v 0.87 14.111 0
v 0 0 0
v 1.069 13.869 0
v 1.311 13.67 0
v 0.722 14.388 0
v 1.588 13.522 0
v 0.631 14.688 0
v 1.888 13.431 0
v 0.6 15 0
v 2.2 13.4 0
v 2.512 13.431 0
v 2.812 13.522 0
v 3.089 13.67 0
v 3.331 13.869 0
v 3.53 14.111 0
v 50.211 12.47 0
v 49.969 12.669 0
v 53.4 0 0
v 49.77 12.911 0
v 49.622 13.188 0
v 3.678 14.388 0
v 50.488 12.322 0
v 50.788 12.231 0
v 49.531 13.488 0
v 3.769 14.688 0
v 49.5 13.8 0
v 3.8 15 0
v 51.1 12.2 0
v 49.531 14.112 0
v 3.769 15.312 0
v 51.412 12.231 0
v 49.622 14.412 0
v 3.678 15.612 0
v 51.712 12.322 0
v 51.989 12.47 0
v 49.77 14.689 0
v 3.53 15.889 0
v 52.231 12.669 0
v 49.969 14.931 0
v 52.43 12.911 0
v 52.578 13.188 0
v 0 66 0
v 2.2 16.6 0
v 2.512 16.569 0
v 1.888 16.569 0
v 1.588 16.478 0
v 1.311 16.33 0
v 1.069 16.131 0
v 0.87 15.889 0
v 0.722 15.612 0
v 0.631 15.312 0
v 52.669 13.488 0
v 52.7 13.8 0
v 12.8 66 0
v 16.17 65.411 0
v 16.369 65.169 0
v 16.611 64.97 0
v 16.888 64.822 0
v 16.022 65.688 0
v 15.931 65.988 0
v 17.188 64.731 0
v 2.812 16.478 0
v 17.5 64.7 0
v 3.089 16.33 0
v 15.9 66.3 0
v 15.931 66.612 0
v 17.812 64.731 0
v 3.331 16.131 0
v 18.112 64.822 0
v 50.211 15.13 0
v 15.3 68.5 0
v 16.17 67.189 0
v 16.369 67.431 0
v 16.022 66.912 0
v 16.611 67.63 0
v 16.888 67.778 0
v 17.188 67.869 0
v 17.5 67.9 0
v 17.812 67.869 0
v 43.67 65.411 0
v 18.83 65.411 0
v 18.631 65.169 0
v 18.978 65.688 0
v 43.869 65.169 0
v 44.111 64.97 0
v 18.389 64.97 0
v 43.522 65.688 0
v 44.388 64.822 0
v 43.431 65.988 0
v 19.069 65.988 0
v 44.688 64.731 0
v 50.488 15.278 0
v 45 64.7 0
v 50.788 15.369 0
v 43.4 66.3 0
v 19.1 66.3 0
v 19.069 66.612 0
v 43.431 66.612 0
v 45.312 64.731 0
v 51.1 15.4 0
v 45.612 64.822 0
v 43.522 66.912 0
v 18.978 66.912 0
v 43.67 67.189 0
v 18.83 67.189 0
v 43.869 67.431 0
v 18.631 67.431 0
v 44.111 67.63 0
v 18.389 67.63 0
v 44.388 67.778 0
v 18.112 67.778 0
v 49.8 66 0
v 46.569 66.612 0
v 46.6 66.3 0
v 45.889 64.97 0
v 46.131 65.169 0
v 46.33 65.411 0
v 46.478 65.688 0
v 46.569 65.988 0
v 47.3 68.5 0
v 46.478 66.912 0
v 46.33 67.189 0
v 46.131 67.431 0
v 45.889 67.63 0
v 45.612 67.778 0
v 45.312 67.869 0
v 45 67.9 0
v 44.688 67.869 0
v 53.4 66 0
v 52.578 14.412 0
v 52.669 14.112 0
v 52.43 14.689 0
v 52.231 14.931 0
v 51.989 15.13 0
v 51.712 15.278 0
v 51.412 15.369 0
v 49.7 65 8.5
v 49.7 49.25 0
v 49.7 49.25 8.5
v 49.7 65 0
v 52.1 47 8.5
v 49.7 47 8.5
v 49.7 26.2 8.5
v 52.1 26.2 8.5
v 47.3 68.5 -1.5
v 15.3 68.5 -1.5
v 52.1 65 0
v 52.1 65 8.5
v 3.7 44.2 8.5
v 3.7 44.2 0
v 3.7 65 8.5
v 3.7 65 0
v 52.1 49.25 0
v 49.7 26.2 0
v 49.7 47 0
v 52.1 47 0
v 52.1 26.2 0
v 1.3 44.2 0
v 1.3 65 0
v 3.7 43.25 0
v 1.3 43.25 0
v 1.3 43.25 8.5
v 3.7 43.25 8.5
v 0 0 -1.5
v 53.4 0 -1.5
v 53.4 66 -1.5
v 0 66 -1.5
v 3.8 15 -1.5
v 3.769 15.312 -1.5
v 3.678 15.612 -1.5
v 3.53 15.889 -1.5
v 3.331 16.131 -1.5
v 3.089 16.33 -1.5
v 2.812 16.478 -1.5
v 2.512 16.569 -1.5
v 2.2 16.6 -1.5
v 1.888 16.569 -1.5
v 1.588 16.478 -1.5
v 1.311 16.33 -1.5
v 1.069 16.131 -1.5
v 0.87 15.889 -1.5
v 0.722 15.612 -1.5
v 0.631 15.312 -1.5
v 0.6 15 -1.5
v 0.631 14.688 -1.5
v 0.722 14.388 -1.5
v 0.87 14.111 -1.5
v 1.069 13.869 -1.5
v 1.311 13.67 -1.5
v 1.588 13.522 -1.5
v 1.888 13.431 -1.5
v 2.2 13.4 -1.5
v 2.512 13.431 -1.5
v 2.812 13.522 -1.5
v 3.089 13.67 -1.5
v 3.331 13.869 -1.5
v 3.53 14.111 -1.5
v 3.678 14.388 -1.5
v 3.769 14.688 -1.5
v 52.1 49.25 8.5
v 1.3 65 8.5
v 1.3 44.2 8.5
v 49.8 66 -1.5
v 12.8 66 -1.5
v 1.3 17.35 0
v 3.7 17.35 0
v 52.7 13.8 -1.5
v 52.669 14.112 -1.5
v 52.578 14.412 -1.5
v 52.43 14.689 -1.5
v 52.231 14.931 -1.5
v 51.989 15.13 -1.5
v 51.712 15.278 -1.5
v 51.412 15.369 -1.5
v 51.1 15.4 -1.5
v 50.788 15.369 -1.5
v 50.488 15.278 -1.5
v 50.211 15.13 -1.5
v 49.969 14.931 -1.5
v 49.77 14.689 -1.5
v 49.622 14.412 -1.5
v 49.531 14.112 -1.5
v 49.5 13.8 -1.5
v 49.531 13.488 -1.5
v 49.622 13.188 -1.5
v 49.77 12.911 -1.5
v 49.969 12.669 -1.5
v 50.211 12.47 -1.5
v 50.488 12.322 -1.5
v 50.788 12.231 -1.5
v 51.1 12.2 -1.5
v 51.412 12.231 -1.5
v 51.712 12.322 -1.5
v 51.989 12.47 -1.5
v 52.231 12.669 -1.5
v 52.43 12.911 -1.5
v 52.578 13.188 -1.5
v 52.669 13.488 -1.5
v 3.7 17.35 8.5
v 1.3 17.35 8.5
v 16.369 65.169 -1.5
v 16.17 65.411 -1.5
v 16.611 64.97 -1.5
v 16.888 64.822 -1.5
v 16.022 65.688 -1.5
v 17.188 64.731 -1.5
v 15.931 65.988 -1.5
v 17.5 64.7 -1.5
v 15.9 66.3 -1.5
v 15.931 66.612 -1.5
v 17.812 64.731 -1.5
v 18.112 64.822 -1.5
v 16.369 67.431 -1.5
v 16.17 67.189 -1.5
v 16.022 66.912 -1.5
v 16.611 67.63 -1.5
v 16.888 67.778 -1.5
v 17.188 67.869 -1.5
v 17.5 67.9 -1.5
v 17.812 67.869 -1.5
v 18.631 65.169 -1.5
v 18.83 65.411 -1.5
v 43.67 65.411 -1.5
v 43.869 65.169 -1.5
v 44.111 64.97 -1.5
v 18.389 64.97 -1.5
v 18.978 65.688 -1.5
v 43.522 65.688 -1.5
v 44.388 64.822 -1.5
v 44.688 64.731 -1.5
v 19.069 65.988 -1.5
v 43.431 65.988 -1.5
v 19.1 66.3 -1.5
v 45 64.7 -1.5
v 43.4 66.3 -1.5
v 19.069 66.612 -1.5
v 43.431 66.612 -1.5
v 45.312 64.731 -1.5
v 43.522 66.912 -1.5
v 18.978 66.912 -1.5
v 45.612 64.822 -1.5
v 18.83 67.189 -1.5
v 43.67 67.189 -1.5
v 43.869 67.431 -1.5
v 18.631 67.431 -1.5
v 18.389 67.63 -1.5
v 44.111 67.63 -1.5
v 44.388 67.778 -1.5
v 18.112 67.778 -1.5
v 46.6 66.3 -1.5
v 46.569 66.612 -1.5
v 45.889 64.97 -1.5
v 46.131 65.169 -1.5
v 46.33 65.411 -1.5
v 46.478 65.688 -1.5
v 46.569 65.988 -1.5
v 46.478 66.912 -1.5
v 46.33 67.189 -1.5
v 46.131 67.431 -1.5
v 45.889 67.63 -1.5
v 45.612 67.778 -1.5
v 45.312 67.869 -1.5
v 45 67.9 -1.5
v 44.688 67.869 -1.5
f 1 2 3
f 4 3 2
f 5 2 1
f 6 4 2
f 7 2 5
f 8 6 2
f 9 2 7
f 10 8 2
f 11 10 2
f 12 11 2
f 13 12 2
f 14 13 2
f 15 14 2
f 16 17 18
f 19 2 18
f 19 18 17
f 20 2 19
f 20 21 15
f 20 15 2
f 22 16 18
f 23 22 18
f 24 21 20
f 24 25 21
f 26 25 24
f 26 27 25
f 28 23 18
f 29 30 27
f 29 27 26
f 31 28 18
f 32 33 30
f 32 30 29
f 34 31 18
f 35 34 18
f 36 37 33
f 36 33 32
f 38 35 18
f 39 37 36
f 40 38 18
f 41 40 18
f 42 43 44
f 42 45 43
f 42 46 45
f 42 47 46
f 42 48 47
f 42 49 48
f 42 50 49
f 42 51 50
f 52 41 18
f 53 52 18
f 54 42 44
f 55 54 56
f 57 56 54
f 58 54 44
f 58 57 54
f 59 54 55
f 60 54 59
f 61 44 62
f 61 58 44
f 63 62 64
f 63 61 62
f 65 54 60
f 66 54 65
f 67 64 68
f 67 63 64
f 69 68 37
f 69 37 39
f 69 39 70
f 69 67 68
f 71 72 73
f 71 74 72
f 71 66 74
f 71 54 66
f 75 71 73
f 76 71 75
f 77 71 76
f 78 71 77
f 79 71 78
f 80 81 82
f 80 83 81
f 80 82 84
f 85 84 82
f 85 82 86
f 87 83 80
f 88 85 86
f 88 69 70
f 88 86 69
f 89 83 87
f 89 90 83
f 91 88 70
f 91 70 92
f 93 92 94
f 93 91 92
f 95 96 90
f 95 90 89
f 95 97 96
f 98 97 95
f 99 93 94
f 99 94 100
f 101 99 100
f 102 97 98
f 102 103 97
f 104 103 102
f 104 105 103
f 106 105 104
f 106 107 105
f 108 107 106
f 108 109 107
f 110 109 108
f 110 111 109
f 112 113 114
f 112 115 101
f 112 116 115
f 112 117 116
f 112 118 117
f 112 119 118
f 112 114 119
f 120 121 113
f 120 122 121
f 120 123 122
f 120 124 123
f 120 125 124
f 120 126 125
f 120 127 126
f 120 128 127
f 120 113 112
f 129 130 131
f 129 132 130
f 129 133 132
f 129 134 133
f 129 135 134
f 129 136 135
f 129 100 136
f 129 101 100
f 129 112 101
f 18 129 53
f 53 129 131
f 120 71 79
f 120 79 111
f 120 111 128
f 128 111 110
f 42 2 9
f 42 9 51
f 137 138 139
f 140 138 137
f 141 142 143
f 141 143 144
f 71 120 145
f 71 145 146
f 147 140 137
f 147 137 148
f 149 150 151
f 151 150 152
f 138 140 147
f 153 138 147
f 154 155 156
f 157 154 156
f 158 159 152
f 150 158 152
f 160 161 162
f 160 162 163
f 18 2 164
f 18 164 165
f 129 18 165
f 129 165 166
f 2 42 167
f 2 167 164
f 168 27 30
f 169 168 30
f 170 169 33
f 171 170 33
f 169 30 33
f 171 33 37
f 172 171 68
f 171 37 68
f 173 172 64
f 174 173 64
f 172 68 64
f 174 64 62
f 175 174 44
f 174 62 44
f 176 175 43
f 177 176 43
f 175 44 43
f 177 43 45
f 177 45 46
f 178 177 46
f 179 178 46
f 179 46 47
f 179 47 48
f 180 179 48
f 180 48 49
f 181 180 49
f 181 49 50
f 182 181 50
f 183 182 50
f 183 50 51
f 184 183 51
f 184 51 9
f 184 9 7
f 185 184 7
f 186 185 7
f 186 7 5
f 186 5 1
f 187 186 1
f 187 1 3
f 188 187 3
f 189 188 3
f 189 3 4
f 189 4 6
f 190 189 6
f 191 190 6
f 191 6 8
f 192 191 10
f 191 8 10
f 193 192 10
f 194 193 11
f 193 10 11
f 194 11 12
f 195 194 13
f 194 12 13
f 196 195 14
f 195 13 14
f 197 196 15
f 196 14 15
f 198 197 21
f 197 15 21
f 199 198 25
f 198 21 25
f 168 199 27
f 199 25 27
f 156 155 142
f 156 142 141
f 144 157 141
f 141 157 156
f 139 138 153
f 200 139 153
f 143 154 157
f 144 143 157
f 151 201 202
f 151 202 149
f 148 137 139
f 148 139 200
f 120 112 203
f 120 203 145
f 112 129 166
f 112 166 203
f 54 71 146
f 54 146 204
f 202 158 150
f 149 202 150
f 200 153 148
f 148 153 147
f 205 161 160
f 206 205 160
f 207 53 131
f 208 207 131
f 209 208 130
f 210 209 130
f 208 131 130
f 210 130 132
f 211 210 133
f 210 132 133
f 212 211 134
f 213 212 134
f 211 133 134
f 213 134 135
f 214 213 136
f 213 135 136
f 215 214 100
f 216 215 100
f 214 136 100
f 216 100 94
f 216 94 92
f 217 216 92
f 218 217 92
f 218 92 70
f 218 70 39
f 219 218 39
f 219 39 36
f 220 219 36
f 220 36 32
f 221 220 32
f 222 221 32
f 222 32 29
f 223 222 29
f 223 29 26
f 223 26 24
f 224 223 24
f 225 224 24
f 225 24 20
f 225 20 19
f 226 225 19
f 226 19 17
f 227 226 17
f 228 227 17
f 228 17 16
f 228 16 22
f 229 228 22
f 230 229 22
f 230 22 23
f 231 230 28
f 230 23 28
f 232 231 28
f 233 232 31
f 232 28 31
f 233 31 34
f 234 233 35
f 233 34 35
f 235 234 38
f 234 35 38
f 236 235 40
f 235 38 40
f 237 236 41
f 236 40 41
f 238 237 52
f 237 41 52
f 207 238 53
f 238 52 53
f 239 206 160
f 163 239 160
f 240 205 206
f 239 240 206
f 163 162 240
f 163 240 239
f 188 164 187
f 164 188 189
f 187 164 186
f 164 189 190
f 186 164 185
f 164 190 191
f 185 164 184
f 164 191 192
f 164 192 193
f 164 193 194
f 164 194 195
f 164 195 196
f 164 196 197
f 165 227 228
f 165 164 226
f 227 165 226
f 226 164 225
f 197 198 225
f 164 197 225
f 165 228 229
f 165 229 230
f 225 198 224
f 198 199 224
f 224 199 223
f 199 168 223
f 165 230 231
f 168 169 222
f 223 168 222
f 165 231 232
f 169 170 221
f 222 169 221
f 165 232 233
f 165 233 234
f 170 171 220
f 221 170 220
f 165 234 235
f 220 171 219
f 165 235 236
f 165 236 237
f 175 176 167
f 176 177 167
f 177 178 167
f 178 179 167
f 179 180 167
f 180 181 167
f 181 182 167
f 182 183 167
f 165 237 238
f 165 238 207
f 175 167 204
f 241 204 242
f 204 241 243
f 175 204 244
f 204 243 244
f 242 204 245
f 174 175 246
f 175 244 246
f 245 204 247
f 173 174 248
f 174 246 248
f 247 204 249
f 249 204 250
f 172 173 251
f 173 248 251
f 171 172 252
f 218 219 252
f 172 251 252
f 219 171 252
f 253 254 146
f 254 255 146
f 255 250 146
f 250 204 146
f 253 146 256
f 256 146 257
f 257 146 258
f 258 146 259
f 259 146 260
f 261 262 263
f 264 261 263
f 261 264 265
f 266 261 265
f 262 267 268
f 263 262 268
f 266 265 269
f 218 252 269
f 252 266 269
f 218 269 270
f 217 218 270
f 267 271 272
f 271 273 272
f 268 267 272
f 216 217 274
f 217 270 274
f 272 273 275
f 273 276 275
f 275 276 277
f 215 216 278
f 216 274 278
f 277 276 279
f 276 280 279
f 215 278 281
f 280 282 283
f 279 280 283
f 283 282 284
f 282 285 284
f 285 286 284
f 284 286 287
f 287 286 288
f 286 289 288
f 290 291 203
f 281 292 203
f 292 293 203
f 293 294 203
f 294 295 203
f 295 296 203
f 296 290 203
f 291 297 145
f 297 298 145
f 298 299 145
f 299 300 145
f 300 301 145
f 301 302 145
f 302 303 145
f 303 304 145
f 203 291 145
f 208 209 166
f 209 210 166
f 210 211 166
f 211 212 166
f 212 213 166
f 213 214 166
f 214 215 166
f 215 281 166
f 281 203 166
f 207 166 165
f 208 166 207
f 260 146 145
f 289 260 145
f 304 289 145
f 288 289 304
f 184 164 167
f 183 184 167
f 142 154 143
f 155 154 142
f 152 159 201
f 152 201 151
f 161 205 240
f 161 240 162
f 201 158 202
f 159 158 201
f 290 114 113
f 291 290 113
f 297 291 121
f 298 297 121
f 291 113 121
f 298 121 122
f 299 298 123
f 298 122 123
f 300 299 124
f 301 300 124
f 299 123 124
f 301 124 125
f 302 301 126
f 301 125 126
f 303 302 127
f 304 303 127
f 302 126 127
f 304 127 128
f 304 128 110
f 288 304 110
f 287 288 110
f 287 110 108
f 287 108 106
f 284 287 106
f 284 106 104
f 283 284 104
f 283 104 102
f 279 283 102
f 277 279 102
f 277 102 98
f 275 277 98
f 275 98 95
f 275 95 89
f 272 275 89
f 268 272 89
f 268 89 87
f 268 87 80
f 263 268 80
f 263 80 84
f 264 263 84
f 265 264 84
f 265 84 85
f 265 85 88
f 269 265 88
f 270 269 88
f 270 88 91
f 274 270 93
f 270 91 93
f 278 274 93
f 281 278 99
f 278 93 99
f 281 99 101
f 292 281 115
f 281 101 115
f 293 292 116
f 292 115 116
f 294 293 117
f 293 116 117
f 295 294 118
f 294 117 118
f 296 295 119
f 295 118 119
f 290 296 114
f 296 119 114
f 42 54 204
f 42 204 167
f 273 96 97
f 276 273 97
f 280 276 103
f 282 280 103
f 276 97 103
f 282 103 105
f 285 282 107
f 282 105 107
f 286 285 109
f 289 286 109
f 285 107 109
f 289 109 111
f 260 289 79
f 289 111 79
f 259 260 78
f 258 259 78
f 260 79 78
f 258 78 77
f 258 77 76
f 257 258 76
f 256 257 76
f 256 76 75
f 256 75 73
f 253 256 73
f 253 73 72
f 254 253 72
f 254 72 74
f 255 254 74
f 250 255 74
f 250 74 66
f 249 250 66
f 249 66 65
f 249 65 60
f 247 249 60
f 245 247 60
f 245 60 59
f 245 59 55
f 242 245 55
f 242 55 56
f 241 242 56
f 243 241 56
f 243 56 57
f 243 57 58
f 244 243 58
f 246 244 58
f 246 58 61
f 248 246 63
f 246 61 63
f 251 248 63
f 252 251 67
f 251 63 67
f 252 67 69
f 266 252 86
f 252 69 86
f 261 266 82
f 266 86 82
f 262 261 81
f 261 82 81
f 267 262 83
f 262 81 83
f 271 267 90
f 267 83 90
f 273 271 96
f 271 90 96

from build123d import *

# Parameters (mm, degrees)
PAD_DEPTH    = 1.5
SKETCH001_R  = 1.6
POCKET_DEPTH = 1.501
SKETCH002_W  = 2.4
SKETCH002_H  = 25.9
PAD001_DEPTH = 8.5
SKETCH003_W  = 2.4
SKETCH003_H  = 20.8
PAD002_DEPTH = 8.5
SKETCH004_W  = 2.4
SKETCH004_H  = 20.8
PAD003_DEPTH = 8.5
SKETCH005_W  = 2.4
SKETCH005_H  = 15.75
PAD004_DEPTH = 8.5


with BuildPart() as mainboard:
    # Sketch → Pad (new body)
    with BuildSketch(Plane.XY):
        Polygon((0, 0), (53.4, 0), (53.4, 66), (49.8, 66), (47.3, 68.5), (15.3, 68.5), (12.8, 66), (0, 66), align=None)
    extrude(amount=-PAD_DEPTH)

    # Sketch001 → Pocket (cut, through all)
    with BuildSketch(Plane.XY):
        with Locations((2.2, 15)):
            Circle(SKETCH001_R)
        with Locations((51.1, 13.8)):
            Circle(SKETCH001_R)
        with Locations((17.5, 66.3)):
            Circle(SKETCH001_R)
        with Locations((45, 66.3)):
            Circle(SKETCH001_R)
    extrude(amount=-POCKET_DEPTH, mode=Mode.SUBTRACT)


with BuildPart() as header1_10pin:
    # Sketch002 → Pad001 (new body)
    with BuildSketch(Plane.XY):
        with Locations((2.5, 30.3)):
            Rectangle(SKETCH002_W, SKETCH002_H)
    extrude(amount=PAD001_DEPTH)


with BuildPart() as header2_8pin:
    # Sketch003 → Pad002 (new body)
    with BuildSketch(Plane.XY):
        with Locations((2.5, 54.6)):
            Rectangle(SKETCH003_W, SKETCH003_H)
    extrude(amount=PAD002_DEPTH)


with BuildPart() as header3_8pin:
    # Sketch004 → Pad003 (new body)
    with BuildSketch(Plane.XY):
        with Locations((50.9, 36.6)):
            Rectangle(SKETCH004_W, SKETCH004_H)
    extrude(amount=PAD003_DEPTH)


with BuildPart() as header4_6pin:
    # Sketch005 → Pad004 (new body)
    with BuildSketch(Plane.XY):
        with Locations((50.9, 57.125)):
            Rectangle(SKETCH005_W, SKETCH005_H)
    extrude(amount=PAD004_DEPTH)


solid = Compound([mainboard.part, header1_10pin.part, header2_8pin.part, header3_8pin.part, header4_6pin.part])
